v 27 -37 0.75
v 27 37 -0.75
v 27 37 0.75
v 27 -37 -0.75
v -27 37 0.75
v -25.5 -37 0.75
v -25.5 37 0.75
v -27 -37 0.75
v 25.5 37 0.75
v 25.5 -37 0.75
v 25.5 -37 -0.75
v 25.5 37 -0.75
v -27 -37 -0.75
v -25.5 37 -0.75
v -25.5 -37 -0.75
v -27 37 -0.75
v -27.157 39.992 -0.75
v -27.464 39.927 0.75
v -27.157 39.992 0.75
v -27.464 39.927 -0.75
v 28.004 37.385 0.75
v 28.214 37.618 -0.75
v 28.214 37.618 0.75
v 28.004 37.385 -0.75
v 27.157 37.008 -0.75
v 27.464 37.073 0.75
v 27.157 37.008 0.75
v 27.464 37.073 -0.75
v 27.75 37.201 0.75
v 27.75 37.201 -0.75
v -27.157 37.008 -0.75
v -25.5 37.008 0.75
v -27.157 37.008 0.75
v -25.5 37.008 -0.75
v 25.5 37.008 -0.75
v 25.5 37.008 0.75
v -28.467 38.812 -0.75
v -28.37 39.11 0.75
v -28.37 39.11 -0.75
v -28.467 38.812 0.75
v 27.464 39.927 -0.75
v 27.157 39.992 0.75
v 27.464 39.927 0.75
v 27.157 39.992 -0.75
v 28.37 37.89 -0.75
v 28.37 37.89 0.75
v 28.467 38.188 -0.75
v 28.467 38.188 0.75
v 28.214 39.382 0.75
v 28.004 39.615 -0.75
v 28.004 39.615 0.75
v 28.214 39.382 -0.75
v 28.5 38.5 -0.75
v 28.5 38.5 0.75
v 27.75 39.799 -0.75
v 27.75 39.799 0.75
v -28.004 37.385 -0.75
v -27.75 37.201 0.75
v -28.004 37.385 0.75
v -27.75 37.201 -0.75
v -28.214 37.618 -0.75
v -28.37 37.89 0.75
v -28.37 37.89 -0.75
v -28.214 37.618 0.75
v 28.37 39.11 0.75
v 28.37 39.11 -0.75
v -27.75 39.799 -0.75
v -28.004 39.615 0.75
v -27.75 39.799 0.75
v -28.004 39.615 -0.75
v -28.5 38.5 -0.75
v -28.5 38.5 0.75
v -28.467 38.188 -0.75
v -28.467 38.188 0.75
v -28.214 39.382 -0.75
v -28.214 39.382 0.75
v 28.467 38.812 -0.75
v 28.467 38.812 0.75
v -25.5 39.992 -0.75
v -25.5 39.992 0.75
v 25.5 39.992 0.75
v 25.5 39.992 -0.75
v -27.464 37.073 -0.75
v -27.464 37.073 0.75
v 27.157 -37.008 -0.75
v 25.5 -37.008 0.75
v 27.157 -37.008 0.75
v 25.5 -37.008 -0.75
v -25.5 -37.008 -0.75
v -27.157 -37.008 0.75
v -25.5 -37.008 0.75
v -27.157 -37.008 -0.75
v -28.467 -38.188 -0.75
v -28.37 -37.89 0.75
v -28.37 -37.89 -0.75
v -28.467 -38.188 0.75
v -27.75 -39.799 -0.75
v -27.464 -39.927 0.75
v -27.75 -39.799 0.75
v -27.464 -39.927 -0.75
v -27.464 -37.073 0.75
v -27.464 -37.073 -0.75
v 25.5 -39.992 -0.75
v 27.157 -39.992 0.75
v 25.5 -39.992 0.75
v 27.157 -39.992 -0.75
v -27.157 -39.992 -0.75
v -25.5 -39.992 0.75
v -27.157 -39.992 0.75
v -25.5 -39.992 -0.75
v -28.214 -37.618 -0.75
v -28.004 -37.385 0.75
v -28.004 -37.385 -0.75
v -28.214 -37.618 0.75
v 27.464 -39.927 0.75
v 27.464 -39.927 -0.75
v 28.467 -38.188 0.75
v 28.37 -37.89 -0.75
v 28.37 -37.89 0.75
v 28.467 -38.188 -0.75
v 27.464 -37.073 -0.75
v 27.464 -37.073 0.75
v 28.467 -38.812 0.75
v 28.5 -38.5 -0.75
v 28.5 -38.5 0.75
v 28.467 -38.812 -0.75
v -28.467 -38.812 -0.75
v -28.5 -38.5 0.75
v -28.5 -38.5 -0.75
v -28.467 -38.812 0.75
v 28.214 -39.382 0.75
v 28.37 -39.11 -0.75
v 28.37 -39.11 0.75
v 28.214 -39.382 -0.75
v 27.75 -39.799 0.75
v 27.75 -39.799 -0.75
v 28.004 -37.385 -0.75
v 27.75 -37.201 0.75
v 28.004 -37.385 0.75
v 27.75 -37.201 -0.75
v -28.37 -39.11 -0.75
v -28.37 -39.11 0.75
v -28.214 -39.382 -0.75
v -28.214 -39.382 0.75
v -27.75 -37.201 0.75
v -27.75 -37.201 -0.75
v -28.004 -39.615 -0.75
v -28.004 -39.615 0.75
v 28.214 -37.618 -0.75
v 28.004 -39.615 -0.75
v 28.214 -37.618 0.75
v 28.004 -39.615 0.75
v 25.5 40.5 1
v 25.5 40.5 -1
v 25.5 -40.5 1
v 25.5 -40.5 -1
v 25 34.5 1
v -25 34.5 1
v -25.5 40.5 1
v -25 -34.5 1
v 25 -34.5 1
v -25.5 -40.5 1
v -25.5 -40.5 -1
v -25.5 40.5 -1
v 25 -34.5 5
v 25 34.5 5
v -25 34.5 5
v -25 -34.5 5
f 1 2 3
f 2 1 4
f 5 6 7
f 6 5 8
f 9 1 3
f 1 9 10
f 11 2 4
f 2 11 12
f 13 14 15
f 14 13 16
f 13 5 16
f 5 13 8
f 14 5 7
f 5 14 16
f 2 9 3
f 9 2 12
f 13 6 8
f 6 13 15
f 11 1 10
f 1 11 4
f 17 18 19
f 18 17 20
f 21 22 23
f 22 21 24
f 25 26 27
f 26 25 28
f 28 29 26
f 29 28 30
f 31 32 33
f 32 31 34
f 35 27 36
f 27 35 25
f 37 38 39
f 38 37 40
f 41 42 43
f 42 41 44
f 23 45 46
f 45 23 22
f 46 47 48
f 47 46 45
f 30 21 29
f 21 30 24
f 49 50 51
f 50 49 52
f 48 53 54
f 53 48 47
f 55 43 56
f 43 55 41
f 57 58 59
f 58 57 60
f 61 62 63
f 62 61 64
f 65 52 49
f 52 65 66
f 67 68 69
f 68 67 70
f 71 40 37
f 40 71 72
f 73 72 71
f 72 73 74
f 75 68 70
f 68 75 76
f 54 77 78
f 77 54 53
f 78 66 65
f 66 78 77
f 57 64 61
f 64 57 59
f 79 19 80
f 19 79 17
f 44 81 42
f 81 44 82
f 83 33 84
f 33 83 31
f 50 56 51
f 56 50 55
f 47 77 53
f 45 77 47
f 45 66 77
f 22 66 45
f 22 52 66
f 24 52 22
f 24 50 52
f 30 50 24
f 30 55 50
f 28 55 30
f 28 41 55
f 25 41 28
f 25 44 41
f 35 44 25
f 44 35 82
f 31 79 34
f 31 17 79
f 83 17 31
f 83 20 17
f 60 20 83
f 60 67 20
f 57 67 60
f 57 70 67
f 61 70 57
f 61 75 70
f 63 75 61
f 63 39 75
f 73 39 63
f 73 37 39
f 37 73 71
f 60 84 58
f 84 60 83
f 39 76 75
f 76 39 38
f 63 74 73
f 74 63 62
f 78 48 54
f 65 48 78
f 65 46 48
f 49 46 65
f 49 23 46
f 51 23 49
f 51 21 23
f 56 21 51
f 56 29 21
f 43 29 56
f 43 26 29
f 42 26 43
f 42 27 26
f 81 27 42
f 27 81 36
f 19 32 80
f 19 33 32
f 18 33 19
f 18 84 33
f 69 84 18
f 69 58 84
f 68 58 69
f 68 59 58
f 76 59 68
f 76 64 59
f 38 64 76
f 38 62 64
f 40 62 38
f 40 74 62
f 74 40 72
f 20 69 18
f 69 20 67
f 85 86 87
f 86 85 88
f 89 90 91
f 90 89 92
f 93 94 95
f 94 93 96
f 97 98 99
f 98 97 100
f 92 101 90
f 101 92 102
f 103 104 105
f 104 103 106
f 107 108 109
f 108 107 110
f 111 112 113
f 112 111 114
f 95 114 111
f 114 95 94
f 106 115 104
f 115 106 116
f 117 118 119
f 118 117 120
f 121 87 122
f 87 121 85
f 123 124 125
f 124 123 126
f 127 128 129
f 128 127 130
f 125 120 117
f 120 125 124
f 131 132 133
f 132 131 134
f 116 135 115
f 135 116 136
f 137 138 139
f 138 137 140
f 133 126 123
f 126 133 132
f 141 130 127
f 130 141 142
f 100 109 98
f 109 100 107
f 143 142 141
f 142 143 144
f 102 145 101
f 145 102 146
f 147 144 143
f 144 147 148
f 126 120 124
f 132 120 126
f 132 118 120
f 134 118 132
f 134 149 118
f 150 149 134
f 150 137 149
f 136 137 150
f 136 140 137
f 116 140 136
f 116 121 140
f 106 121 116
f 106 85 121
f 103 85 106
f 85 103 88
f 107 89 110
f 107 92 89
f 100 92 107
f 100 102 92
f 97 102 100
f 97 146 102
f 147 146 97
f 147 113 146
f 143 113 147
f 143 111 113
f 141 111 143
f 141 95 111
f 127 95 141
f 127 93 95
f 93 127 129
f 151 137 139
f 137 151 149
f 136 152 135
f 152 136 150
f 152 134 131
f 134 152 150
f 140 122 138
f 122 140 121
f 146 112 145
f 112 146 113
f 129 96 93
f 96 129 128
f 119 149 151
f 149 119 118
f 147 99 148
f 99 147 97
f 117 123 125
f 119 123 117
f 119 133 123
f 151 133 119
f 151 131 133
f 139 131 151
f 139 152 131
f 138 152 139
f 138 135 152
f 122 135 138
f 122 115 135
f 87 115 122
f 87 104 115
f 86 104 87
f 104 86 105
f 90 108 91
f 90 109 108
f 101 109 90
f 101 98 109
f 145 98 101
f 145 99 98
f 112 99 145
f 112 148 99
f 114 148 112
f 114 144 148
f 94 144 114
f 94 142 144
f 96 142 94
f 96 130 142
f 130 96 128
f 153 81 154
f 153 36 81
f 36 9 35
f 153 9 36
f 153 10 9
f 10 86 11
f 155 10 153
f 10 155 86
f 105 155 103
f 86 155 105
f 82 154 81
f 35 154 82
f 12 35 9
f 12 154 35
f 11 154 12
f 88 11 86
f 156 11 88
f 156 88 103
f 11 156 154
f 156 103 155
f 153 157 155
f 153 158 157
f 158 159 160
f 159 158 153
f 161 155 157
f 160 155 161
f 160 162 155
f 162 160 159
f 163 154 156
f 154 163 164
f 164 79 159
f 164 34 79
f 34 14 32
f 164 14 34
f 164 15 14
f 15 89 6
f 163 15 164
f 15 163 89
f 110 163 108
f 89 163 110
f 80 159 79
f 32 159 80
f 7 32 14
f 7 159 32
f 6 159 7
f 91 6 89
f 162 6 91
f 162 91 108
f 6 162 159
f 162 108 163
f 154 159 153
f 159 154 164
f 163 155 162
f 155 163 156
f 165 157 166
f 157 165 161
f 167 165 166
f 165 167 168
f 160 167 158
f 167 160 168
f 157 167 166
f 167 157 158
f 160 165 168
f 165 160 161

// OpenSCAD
// file: ../settings.scad
// Common settings used by all scad files.

// ALL UNITS IN MILLIMETERS (MM)!!!

$fn = 30;//low-res but fast to render
//$fn = 50;//higher-res but slow to render

pi = 3.1415926535897932384626433832795;

max_footprint = 150; // 15x15 cm

bottom_clearance = 10;
bottom_clearance = 25.4/2+10;
//bottom_clearance = 30;

shell_alpha = 0.215;
//shell_alpha = 1.0;

tolerance = 0.5;

// Flat countersunk M2.5mm x 0.45mm machine screw.
screw_thread_diameter = 2.5;//2.8;//2.75;//2.4?
screw_thread_length = 5;//?
screw_head_diameter = 4.75; // M2.5
//screw_head_diameter = 5.2; // M3
screw_head_height = 1.5;//2;

screw_thread_diameter2 = 2;

unit_thickness = 5;
u = unit_thickness;

shell_thickness = unit_thickness;

// Show flags.
show_platform = 0;
show_head = 1;
show_head_shell = 0;
show_head_electronics_bb = 0;
show_battery = 1;
show_foot_cube = 0;
show_torso = 0;
show_motor = 0;
show_motor_plates = 1;
show_motor_inner_plates = 1;
show_motor_outer_plates = 1;
show_wheel = 0;//obsolete
show_tracks = 1;//
show_track_wheels = 1;
show_caster = 0;
show_rpi = 1;
show_vertical_plates = 1;//
show_horizontal_plates = 1;//
show_caster_plates = 0;//obsolete?
show_camera = 1;
show_screen = 0;
show_edge_mount = 1;
show_sonar_mount = 1;
show_recharge_mount = 1;
show_conduit = 1;
show_torso_shell = 1;
show_recharge_dock = 0;
show_head_tilt_axis = 0;
show_rpi_camera_axis = 0;
show_laser_axis = 0;

head_vertical_angle_tilt = 0;
//head_vertical_angle_tilt = 30;//max
//head_vertical_angle_tilt = 10;

torso_height = 120+20;

base_plate_diameter = max_footprint-unit_thickness*2;
base_plate_frame = 0;

head_height = 50;
head_offset_z = max_footprint/2;
head_middle_cutout = 85;

rpi_with_four_hats_and_clearance = 76;

qrd1114_w = 6.10;
qrd1114_l = 4.39;
qrd1114_h = 4.65;

dock_radius = 10;
dock_gripper_border = 2;
dock_gripper_instep = 0.9;
dock_gripper_cutout_tapper = 50;
dock_receiver_height = 5;

// Patriod Fuel+ 9000 mAh
battery_length = 90;
battery_width = 57;
battery_height = 23;
battery_offset_z = 30;//4;

wheel_diameter = 50;
wheel_offset_x = 65;
wheel_offset_z = wheel_diameter/2;
wheel_axle_diameter = 5;

//caster_diameter = 19.05; // 0.75 inches
caster_diameter = 25.45; // 1 inches
//caster_diameter = 15.875; // 5/8 inches
caster_holder_diameter = 30;//31;
caster_offset_y = base_plate_diameter/2 - caster_holder_diameter/2;

arduino_offset_x = 0;
arduino_offset_y = 0;
arduino_offset_z = 67;
arduino_offset_x2 = 0;
arduino_offset_y2 = -20;
arduino_offset_z2 = torso_height+bottom_clearance;

horizontal_plate_width = unit_thickness*8*2 - unit_thickness*2;
horizontal_plate_depth = unit_thickness*8*2;

vertical_plate_width = horizontal_plate_depth;
vertical_plate_height = unit_thickness*8;
vertical_plate_offset_x = wheel_offset_x-22.5;
vertical_plate_offset_z = vertical_plate_height/2 + unit_thickness/2;

vertical_battery_plate_height = 100 - 15;

caster_plate_width = horizontal_plate_width + unit_thickness*2;
caster_plate_mount_length = unit_thickness*4;
caster_plate_width_minor = caster_holder_diameter;

motor_switch_length = 20;
motor_switch_thickness = 6.5;
motor_switch_height = 11;
motor_switch_height_leads = 23;
motor_switch_on_height =  13.3;
motor_switch_hole_diameter = 2.5;
motor_switch_hole_offset_z = 6.5;//this plus diameter/2 is hole center from switch top
motor_switch_hole_spacing = 7.1;// holes are diameter/2 from this

motor_length = 60;
motor_width = 25;
motor_collar_width = 7;
motor_collar_height = 2.5;
motor_axle_width = 4;
motor_axle_height = 9.5;
motor_offset_x = 10;
//motor_offset_y = motor_width/2+5;
motor_offset_y = unit_thickness*3.5;
motor_offset_z = vertical_plate_height/2 - unit_thickness/2;//4;//30;
motor_mount_holes_dist = 17;
// motor countersink hole
motor_mount_holes_width = 3; // M3
motor_mount_holes_head_height = 2.2;
motor_mount_holes_head_width = 5.8;
motor_bearing_outer_diameter = 10;
motor_bearing_inner_diameter = 5.95;
motor_bearing_thickness = 2.5;

motor_unimount_idler_axle_d = screw_thread_diameter;
//motor_unimount_spacer_depth = 0.1;//too small
motor_unimount_spacer_depth = 0.5;

motor_arm_offset_y = -u*3;
motor_arm_offset_z = u*.5;

motor_plate_width = vertical_plate_width;
motor_plate_height = vertical_plate_height;
motor_plate_thickness = unit_thickness;
motor_plate_offset_z = vertical_plate_offset_z;

motor_plate_middle_thickness = 5;

wheel_hub_offset = u*3;

motor_hole_height_offset = -5;

nylon_spacer_outer_diameter = 6.35;
nylon_spacer_inner_diameter = 3.302;
nylon_spacer_length = 12.7;

track_width = unit_thickness*3;
track_offset_x = -50;
track_offset_z = .1;
//track_wheel_radius = 19;//original
track_wheel_radius = 14;
//track_wheel_hole_radius = (nylon_spacer_outer_diameter+1)/2;
track_wheel_hole_radius = motor_bearing_outer_diameter/2;

track_driver_hole_radius = (motor_axle_width)/2 + 0.1;
track_driver_set_screw_head_d = 4.1;
track_driver_set_screw_shaft_d = 2.4;
//track_wheel_width = 13.5;//original
track_wheel_width = u*2;
track_wheel_width_buffer = u*0.25;
track_offset = 3;        //distance from chassis
track_wheel_offset = track_offset;
//track_length = 250; // see tread_triangle.py, too big
//track_length = 240; // see tread_triangle.py
//track_length = 238; //inc/dec in 10 unit increments so notches match idlers
track_length = 228; //inc/dec in 10 unit increments so notches match idlers
track_radius = track_length/2/pi;
track_wheel_show_fancy = 1;
track_wheel_gap = track_wheel_width + track_wheel_width_buffer*2;
track_axle_bearing_diameter = motor_bearing_inner_diameter - 0.1;
track_tensioner_radius = 12;
track_nut_height = 3.5; //TODO
track_punchout_thickness = 0.25;//should be the same as the minimum layer thickness

head_slew_bearing_outer_diameter = 115;
head_slew_bearing_ring_thickness = 20;
head_slew_bearing_inner_diameter = head_slew_bearing_outer_diameter - head_slew_bearing_ring_thickness;
//head_slew_bearing_hole_diameter = head_slew_bearing_inner_diameter - head_slew_bearing_ring_thickness;
head_slew_bearing_hole_diameter = 12+tolerance; // slip ring https://www.adafruit.com/products/775
//head_slew_bearing_ball_diameter = 5;
head_slew_bearing_ball_diameter = 2.5; //u/2;
head_slew_bearing_height = u;//head_slew_bearing_ball_diameter*2;
head_slew_bearing_gap = 0.5;
head_slew_bearing_slew_gap = 0;
head_slew_bearing_gap_factor = 0.1;

neck_strut_width = u*7;
neck_strut_height = u*18;
neck_strut_spacing = u*8;

show_outer_race = 0;
show_inner_race_a = 1;
show_inner_race_b = 1;
show_balls = 0;
// main file
include <../settings.scad>;

module make_35_screen(){
    //http://www.neosecsolutions.com//products.php?47&cPath=20
    cube([83,55,20], center=true);
}
module make_adafruit_1770_screen(){
    //https://www.adafruit.com/products/1770
    /*
    Board: 51mm x 81mm x 2mm / 2" x 3.2" x 0.08"
    Screen: 50mm x 69mm x 4mm / 2" x 2.7" x 0.2"
    Mounting Holes: 54mm x 74mm / 2.1" x 2.9"
    */
	hole_od = 3;

	color("red")
    cube([51,81,2], center=true);//board

	color("blue")
	translate([0,0,2+1])
    cube([50,69,4], center=true);//screen

	color("green"){
	    cube([54,74,1.5], center=true);//holes

		hull(){
			for(i=[-1:2:1]){
				translate([54/2*i,74/2+hole_od/2,0])
				cylinder(d=hole_od, h=1.5, center=true);
			}
		}
		hull(){
			for(i=[-1:2:1]){
				translate([54/2*i,-(74/2+hole_od/2),0])
				cylinder(d=hole_od, h=1.5, center=true);
			}
		}
	}
}

//make_35_screen();
make_adafruit_1770_screen();
